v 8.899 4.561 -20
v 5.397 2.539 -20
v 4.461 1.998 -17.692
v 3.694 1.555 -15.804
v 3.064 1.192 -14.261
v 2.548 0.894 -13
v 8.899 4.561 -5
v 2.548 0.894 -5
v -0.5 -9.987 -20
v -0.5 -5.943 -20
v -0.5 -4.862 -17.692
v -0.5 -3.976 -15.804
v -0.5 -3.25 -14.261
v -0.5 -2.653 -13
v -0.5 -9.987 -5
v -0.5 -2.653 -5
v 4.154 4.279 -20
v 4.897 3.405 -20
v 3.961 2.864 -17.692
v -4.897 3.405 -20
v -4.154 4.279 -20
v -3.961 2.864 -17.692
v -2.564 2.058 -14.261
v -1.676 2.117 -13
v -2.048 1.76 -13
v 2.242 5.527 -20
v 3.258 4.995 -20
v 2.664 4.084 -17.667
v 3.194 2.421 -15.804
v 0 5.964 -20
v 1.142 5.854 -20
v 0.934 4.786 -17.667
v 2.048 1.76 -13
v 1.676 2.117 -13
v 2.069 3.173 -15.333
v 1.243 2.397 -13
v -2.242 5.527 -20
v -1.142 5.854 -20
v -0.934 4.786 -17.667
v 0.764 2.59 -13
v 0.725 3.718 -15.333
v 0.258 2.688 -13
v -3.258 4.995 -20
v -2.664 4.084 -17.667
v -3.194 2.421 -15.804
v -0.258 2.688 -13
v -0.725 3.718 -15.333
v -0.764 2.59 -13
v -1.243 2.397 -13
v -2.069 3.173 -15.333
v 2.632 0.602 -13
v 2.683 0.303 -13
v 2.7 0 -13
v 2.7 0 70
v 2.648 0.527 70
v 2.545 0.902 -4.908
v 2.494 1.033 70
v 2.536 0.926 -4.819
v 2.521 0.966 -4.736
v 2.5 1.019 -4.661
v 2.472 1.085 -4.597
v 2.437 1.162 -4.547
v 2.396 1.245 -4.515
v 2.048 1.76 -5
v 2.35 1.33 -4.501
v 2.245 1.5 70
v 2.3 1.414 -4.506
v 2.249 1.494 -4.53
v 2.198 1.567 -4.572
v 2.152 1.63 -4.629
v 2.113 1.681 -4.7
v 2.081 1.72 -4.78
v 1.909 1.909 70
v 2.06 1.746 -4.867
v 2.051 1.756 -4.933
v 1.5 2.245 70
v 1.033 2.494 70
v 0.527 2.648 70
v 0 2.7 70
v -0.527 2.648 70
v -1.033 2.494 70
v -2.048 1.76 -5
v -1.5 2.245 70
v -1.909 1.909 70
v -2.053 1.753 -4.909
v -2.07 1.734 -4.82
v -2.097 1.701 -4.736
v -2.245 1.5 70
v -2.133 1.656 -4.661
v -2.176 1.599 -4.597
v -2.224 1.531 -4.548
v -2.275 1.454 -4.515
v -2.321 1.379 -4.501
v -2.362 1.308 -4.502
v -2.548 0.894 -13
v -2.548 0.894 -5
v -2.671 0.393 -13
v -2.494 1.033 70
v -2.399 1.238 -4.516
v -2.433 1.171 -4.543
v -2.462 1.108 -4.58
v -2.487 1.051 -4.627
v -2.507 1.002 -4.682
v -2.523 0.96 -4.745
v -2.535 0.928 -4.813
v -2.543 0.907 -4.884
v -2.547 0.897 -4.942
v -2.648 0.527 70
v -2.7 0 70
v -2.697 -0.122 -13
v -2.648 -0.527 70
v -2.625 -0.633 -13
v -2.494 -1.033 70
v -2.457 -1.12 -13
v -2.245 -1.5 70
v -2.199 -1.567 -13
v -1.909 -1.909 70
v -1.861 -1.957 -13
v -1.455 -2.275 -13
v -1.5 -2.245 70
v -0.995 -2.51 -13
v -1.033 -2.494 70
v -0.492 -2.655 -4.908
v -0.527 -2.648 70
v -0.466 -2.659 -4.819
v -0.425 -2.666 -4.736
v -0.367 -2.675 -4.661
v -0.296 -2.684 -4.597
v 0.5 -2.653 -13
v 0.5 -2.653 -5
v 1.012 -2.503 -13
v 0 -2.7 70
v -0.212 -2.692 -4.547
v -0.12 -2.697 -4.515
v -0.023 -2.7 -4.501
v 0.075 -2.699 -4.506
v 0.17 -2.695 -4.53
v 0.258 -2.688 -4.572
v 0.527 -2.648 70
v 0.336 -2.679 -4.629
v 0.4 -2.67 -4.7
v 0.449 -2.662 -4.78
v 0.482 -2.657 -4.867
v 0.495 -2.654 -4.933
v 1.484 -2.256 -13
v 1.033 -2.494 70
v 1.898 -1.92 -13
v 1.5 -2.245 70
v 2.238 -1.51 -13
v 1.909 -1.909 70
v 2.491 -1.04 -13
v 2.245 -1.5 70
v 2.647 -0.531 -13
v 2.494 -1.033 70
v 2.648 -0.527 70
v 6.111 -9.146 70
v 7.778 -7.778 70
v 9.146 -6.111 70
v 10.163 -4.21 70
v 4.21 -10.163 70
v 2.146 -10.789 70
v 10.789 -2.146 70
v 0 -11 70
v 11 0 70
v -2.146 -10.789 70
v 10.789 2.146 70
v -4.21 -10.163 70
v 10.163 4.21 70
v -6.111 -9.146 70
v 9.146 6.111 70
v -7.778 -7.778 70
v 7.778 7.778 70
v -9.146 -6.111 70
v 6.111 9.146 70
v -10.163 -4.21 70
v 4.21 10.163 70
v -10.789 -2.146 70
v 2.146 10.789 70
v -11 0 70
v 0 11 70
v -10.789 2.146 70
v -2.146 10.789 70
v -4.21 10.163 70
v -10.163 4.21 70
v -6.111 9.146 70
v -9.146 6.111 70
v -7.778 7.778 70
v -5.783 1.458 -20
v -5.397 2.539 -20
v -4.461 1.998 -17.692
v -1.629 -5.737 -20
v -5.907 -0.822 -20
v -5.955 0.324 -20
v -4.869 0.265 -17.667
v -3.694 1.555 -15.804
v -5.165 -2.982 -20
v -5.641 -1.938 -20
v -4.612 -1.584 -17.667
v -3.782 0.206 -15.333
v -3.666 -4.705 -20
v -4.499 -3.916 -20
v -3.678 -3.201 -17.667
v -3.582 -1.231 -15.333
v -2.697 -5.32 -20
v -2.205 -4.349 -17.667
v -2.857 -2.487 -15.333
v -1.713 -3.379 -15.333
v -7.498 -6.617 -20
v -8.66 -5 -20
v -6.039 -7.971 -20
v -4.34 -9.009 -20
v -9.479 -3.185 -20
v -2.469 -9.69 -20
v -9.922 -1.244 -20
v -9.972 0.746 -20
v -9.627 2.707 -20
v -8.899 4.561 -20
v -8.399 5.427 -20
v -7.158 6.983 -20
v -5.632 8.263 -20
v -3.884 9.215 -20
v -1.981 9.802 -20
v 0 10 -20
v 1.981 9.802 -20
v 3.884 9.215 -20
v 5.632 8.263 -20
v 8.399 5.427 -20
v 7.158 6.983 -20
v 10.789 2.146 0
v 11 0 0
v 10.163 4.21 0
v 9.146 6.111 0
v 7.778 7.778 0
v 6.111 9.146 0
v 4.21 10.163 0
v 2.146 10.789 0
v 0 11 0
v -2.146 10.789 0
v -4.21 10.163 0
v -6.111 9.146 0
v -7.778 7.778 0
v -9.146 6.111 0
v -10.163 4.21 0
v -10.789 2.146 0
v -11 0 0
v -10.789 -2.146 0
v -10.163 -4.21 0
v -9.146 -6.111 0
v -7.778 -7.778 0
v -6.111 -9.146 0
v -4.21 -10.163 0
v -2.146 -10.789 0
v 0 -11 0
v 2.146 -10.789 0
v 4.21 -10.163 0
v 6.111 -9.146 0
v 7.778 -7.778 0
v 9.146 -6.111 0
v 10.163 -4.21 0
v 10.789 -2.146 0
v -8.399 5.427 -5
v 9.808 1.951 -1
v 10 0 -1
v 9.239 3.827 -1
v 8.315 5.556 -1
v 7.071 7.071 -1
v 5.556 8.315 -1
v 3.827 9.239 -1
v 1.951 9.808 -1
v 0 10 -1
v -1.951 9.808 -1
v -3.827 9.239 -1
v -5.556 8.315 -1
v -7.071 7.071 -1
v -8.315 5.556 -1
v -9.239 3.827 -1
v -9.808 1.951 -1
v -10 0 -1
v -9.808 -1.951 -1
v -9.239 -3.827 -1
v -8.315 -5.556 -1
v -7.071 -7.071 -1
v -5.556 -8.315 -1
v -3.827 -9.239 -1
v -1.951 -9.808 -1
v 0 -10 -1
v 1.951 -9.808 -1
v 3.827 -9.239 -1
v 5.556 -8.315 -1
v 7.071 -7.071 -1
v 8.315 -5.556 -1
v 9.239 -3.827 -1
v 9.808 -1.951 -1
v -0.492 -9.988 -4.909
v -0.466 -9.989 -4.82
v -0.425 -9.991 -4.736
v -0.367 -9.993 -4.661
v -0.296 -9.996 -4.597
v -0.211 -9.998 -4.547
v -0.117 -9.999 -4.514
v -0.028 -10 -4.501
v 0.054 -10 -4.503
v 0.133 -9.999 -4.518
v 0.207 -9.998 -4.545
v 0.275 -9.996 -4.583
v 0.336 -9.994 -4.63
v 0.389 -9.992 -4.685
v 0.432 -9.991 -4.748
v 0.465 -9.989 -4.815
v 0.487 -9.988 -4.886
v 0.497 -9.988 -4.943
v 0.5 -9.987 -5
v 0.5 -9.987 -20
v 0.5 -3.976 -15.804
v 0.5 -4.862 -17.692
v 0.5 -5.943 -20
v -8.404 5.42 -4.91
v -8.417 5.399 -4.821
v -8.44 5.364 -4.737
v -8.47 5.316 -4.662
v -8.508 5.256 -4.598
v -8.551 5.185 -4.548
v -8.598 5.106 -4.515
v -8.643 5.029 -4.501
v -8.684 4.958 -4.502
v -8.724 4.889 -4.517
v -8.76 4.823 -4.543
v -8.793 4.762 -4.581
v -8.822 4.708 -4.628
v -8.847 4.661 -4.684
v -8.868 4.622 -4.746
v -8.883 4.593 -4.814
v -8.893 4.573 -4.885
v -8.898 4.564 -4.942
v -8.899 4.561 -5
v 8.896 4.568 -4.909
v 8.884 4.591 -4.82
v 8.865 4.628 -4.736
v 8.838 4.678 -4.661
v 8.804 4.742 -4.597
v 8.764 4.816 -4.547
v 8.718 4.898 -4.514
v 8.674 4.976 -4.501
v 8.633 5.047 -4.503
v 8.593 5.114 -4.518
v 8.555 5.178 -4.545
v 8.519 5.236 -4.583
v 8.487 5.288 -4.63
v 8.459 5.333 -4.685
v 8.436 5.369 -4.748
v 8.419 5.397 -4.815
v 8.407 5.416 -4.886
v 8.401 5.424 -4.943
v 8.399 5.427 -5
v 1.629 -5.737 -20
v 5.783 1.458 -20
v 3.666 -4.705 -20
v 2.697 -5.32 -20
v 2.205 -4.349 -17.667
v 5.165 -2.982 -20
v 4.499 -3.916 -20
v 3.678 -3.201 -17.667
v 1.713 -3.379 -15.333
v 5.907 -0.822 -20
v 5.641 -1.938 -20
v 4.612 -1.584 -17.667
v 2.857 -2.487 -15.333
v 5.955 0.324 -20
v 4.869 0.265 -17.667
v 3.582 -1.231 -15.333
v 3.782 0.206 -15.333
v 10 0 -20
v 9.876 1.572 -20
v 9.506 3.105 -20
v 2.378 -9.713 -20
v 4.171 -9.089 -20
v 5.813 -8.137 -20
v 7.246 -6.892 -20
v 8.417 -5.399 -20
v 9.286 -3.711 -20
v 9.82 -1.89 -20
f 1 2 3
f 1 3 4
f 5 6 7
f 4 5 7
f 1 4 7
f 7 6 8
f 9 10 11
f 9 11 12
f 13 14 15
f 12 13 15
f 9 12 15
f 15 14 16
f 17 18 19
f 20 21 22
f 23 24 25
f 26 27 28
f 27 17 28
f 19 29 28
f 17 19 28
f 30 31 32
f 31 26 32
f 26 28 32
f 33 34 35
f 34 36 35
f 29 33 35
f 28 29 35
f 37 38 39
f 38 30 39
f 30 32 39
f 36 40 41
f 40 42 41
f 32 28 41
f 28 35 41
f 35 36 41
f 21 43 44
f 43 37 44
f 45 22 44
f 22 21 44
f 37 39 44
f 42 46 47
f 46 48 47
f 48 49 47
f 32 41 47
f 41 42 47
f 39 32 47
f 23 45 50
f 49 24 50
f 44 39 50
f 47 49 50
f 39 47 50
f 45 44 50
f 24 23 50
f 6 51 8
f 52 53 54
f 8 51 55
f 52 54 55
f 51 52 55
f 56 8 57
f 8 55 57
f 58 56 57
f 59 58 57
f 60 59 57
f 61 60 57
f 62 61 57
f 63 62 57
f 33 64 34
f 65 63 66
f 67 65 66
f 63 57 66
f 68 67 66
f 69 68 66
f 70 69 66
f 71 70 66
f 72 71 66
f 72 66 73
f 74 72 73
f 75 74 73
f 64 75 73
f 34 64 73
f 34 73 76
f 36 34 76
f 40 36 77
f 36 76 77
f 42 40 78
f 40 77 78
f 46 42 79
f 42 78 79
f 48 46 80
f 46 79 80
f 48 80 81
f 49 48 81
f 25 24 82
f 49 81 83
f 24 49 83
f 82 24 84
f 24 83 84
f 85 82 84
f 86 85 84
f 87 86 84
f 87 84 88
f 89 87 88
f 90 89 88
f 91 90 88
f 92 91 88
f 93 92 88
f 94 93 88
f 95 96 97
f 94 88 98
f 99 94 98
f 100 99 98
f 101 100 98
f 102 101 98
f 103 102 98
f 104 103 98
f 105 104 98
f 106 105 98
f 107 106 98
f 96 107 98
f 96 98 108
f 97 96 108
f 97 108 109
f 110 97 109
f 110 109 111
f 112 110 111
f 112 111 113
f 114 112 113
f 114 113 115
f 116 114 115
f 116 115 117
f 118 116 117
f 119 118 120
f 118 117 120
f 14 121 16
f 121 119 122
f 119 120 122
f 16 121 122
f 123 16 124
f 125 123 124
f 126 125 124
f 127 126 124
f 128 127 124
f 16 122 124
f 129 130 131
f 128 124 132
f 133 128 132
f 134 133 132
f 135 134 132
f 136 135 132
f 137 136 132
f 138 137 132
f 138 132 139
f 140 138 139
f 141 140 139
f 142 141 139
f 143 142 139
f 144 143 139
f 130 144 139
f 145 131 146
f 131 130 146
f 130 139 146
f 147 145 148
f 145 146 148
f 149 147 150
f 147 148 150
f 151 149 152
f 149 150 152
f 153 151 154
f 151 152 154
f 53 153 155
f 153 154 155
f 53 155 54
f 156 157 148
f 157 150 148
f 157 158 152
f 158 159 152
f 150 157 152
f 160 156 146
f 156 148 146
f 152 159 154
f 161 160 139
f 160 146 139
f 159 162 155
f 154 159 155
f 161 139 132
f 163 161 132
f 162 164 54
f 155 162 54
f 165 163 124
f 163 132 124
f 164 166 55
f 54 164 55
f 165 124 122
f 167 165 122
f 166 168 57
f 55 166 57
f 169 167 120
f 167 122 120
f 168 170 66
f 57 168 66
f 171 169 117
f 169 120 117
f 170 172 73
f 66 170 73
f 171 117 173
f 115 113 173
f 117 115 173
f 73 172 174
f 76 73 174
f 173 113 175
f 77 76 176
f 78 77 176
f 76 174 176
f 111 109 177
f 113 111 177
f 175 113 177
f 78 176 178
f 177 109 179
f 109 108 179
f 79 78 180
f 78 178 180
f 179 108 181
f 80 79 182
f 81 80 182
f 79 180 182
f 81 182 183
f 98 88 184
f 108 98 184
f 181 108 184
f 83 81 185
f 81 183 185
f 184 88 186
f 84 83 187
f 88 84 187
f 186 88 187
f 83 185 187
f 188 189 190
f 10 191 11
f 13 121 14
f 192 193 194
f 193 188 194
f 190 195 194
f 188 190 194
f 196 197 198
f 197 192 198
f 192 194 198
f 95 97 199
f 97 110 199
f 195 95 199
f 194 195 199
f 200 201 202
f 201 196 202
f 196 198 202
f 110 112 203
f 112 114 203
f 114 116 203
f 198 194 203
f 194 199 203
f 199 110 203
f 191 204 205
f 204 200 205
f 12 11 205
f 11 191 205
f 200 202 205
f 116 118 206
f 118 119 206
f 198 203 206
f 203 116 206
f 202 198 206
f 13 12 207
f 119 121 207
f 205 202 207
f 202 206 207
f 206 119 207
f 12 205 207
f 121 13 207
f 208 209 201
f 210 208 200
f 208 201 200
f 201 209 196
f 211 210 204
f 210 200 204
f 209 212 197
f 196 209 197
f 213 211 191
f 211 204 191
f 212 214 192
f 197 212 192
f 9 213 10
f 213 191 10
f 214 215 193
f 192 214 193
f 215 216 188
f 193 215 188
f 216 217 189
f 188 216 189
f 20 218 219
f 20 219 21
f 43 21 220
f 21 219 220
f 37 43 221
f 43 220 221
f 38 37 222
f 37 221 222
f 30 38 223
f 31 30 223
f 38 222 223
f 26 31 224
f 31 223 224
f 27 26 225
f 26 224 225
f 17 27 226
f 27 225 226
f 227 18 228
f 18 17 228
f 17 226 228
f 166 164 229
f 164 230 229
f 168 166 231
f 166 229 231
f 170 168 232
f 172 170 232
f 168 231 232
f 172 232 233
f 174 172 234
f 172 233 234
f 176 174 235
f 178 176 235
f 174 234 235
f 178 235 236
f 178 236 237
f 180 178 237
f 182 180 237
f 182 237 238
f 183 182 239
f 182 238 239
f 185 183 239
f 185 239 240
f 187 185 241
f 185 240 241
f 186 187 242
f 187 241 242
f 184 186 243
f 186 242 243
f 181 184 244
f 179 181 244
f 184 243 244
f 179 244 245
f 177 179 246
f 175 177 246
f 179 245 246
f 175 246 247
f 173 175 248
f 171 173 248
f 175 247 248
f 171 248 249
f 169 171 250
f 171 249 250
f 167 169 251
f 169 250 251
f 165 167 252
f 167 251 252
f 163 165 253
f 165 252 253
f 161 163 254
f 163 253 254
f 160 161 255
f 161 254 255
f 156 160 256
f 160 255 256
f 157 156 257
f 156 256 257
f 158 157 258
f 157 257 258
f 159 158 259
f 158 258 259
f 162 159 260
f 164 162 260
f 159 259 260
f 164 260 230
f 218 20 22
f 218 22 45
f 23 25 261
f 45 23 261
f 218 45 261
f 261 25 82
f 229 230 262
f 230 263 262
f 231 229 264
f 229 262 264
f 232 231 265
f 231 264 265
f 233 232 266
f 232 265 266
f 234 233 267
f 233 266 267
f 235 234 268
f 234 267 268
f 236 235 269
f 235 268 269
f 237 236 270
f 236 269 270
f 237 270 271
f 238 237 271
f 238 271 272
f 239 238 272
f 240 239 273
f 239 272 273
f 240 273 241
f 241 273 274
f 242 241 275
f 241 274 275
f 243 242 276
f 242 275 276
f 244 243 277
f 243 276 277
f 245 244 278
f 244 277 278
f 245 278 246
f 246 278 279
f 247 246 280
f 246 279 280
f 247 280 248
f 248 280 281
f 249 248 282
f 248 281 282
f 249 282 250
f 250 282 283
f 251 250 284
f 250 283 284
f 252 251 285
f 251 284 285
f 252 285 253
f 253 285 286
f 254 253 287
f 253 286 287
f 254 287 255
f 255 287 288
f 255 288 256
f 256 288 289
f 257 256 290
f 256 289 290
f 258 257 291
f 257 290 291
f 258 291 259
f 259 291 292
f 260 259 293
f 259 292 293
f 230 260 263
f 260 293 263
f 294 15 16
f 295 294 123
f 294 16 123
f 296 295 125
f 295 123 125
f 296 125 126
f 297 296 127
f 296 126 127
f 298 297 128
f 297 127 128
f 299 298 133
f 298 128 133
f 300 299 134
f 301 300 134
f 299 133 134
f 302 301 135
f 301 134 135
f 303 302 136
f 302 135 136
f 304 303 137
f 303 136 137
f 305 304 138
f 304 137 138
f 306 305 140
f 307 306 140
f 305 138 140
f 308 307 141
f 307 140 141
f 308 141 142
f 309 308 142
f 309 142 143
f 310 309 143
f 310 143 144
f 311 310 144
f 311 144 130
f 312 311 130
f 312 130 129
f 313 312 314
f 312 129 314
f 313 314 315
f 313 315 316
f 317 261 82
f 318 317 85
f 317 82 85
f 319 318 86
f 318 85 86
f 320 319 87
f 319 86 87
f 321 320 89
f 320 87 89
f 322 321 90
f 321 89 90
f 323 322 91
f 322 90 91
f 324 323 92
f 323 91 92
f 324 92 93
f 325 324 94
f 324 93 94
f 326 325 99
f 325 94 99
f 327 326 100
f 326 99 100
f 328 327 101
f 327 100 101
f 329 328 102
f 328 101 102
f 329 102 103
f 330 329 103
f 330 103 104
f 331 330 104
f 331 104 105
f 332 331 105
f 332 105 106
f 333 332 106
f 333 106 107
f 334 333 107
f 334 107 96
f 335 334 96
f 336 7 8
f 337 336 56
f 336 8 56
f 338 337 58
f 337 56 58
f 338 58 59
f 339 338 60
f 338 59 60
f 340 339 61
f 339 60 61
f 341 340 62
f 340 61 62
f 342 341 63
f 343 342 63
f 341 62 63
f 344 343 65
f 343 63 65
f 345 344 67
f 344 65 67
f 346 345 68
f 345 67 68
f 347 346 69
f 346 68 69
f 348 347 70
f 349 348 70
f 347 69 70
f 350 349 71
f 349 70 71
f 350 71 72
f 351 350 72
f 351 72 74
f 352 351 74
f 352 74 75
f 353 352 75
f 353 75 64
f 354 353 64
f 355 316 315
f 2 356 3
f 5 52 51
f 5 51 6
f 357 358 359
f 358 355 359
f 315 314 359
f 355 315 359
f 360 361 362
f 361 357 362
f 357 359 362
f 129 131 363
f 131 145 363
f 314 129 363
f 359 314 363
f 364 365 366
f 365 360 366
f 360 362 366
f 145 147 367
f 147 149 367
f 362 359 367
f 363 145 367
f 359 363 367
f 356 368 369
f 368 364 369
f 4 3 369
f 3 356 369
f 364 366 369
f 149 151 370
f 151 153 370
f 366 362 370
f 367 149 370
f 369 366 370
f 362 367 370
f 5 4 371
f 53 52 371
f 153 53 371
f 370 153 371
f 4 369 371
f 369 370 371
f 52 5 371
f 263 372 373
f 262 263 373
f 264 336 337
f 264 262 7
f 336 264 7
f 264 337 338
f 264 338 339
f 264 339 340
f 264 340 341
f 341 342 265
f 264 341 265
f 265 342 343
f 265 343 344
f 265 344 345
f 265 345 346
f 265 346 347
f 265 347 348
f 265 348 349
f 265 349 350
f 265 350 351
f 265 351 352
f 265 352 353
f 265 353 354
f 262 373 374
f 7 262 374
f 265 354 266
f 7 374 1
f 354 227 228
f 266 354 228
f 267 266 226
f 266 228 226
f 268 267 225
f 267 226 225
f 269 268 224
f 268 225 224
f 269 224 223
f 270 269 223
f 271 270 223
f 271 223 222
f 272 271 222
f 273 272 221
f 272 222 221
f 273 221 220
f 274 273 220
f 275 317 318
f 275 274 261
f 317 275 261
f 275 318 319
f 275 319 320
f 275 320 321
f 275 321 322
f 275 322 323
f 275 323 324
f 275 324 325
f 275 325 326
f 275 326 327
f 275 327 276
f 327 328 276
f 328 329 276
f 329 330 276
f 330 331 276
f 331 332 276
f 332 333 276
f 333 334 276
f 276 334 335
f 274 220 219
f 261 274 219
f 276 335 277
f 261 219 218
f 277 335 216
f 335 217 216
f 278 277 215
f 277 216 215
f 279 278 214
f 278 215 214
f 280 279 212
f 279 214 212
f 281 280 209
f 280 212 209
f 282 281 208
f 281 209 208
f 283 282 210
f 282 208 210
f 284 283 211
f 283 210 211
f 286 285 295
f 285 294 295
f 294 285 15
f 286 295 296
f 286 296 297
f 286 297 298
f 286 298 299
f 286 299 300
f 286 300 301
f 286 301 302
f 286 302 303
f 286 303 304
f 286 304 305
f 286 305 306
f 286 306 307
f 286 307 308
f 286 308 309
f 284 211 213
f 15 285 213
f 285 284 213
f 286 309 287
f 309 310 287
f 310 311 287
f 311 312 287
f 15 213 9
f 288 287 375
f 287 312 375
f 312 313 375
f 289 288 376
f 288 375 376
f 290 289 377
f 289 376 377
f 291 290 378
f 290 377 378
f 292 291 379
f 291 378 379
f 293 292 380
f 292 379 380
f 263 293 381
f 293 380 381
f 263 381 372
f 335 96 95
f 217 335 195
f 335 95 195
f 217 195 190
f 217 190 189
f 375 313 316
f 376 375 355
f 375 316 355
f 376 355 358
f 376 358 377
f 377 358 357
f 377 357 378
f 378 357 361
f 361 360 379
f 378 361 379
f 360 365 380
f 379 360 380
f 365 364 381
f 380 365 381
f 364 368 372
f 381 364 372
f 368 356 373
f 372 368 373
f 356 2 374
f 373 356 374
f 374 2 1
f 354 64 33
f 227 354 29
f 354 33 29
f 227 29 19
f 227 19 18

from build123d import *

# Parameters (mm, degrees)
POCKET_DEPTH       = 201.453094
POLARPATTERN_COUNT = 3


with BuildPart() as part:
    # Sketch → Revolution (revolve)
    with BuildSketch(Plane.XZ):
        Polygon((2.7, 70), (11, 70), (11, 0), (10, -1), (10, -20), (5.964154, -20), (2.7, -13), align=None)
    revolve(axis=Axis((0, 0, 0), (0, 0, 1)))

    # Sketch001 (on DatumPlane) → Pocket (cut, through all)
    with BuildSketch(Plane(origin=(0, 0, -20), x_dir=(1, 0, 0), z_dir=(0, 1, 0))):
        with BuildLine():
            Line((0.5, -15), (0.5, 20))
            Line((0.5, 20), (-0.5, 20))
            Line((-0.5, 20), (-0.5, -15))
            ThreePointArc((-0.5, -15), (0, -15.5), (0.5, -15))
        make_face()
    pocket = extrude(amount=-POCKET_DEPTH, mode=Mode.SUBTRACT)

    # PolarPattern: Pocket ×3 about axis
    polarpattern_axis = Axis((0, 0, 0), (0, 0, 1))
    for i in range(1, POLARPATTERN_COUNT):
        add(pocket.rotate(polarpattern_axis, i * 360 / POLARPATTERN_COUNT), mode=Mode.SUBTRACT)


solid = part.part
